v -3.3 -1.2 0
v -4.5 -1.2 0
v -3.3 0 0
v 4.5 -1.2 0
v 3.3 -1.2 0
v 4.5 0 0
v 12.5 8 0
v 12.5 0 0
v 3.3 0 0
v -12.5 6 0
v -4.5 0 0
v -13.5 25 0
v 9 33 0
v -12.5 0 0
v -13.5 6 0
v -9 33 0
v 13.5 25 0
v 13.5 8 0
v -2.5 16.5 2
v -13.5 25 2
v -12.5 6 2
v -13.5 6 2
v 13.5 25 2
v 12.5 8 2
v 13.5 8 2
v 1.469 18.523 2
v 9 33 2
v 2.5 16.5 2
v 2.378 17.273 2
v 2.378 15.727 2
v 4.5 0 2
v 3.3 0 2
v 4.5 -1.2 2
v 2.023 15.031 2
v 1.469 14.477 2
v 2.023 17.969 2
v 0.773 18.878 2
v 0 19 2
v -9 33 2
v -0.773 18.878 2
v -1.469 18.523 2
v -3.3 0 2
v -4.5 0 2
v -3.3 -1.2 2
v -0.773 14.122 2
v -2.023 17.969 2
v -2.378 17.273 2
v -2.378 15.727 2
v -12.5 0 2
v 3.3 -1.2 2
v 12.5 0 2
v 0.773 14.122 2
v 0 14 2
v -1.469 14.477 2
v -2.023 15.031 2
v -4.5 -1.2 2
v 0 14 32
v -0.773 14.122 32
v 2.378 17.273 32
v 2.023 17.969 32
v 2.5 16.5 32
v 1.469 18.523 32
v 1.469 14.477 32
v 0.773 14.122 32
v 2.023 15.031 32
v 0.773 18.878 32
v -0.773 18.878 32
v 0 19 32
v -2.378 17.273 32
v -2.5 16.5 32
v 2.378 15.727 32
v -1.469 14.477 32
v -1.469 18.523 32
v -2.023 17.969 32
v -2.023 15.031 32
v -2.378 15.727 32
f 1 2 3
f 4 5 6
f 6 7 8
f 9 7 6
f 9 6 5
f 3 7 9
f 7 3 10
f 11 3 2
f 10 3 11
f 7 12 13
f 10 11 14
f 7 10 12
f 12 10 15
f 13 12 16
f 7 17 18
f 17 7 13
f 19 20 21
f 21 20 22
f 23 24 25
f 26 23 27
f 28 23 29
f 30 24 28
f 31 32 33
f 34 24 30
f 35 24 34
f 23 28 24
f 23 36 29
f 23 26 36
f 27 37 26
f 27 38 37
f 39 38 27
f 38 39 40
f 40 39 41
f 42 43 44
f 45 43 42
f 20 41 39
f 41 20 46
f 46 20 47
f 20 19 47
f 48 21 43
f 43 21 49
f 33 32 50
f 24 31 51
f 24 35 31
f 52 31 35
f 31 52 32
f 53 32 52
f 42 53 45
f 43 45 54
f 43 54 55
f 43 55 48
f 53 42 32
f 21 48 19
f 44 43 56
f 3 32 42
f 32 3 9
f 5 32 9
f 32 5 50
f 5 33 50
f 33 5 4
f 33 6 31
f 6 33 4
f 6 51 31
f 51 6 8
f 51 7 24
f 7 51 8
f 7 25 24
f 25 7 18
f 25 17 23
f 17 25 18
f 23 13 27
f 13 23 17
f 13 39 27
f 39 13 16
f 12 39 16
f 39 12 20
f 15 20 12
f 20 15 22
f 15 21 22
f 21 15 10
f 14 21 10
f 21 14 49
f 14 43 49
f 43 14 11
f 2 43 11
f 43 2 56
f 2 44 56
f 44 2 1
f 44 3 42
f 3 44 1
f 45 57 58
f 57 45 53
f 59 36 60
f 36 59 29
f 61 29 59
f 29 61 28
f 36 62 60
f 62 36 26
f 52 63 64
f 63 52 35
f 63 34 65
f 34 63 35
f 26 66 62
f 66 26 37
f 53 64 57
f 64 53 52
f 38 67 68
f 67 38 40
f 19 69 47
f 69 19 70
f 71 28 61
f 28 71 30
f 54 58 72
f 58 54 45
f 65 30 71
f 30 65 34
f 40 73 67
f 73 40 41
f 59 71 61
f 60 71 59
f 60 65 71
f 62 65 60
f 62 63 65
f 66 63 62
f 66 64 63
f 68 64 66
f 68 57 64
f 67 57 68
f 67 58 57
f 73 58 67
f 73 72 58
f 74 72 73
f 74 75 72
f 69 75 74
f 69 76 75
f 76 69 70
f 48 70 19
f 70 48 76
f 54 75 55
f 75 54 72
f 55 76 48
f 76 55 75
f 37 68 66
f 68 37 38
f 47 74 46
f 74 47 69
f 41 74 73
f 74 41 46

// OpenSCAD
// Thickness of the gauge
GaugeThickness     = 2;
// Width of railnops
GleisnoppenStaerke = 1.2;
// Height of railnops
GleisnoppenHoehe   = 1.2;
// Do you want a handle to hold the gauge?
DrawHandle         = true;
// The handle diameter
HandleDiameter     = 5;
// The length of the handle
HandleLength       = 30;
// Rail norm
RailNorm = "N"; // [Z,N,TT,H0,S,0]

// Print overhead area as well
OverheadArea = false;

if (RailNorm == "Z") Nem102Lehre(6.5, 20, 14, 18, 4, 6, 18, 24, 16, 13, 27);
else if (RailNorm == "N") Nem102Lehre(9.0, 27, 18, 25, 6, 8, 25, 33, 22, 18, 37);
else if (RailNorm == "TT") Nem102Lehre(12, 36, 24, 43, 8, 10, 33, 43, 28, 22, 48);
else if (RailNorm == "H0") Nem102Lehre(16.5, 48, 32, 42, 11, 14, 45, 59, 38, 30, 65);
else if (RailNorm == "S")  Nem102Lehre(22.5, 66, 44, 57, 15, 19, 60, 78, 50, 38, 87);
else if (RailNorm == "0")  Nem102Lehre(32, 94, 63, 82, 21, 27, 85, 109, 68, 52, 120);

module Nem102Lehre(G, B1, B2, B3, H1, H2, H3, H4, B4, B5, H5)
{
    translate([-B1/2, 0, 0]) {
            linear_extrude(height=GaugeThickness) {
                polygon(points=[[(B1-B3)/2,0],
                                [(B1-B3)/2,H1],
                                [0,H1],
                                [0,H3],
                                [(B1-B2)/2,H4],
                                [(B1-B2)/2 + B2,H4],
                                [B1,H3],
                                [B1,H2],
                                [B1 - (B1-B3)/2, H2],
                                [B1 - (B1-B3)/2, 0],
                                [B1 - (B1-G)/2, 0],
                                [B1 - (B1-G)/2, -GleisnoppenHoehe],
                                [B1 - (B1-G)/2 - GleisnoppenStaerke, -GleisnoppenHoehe],
                                [B1 - (B1-G)/2 - GleisnoppenStaerke, 0],
                                [(B1-G)/2 + GleisnoppenStaerke, 0],
                                [(B1-G)/2 + GleisnoppenStaerke, -GleisnoppenHoehe],
                                [(B1-G)/2, -GleisnoppenHoehe],
                                [(B1-G)/2, 0]
                
                ]);
                if (OverheadArea) {
                    polygon(points=[[(B1-B4)/2, H3],
                                    [(B1-B4)/2, H5-(B4-B5)/2],
                                    [(B1-B4)/2+(B4-B5)/2, H5],
                                    [(B1-B4)/2+(B4-B5)/2+B5, H5],
                                    [(B1-B4)/2+B4, H5-(B4-B5)/2],
                                    [(B1-B4)/2+B4, H3]
                    ]);
                }
        }
    }
    if (DrawHandle) {
        translate([0, H4/2, 0])
            cylinder($fn=20, r=HandleDiameter/2, h=HandleLength+GaugeThickness);
    }
}
